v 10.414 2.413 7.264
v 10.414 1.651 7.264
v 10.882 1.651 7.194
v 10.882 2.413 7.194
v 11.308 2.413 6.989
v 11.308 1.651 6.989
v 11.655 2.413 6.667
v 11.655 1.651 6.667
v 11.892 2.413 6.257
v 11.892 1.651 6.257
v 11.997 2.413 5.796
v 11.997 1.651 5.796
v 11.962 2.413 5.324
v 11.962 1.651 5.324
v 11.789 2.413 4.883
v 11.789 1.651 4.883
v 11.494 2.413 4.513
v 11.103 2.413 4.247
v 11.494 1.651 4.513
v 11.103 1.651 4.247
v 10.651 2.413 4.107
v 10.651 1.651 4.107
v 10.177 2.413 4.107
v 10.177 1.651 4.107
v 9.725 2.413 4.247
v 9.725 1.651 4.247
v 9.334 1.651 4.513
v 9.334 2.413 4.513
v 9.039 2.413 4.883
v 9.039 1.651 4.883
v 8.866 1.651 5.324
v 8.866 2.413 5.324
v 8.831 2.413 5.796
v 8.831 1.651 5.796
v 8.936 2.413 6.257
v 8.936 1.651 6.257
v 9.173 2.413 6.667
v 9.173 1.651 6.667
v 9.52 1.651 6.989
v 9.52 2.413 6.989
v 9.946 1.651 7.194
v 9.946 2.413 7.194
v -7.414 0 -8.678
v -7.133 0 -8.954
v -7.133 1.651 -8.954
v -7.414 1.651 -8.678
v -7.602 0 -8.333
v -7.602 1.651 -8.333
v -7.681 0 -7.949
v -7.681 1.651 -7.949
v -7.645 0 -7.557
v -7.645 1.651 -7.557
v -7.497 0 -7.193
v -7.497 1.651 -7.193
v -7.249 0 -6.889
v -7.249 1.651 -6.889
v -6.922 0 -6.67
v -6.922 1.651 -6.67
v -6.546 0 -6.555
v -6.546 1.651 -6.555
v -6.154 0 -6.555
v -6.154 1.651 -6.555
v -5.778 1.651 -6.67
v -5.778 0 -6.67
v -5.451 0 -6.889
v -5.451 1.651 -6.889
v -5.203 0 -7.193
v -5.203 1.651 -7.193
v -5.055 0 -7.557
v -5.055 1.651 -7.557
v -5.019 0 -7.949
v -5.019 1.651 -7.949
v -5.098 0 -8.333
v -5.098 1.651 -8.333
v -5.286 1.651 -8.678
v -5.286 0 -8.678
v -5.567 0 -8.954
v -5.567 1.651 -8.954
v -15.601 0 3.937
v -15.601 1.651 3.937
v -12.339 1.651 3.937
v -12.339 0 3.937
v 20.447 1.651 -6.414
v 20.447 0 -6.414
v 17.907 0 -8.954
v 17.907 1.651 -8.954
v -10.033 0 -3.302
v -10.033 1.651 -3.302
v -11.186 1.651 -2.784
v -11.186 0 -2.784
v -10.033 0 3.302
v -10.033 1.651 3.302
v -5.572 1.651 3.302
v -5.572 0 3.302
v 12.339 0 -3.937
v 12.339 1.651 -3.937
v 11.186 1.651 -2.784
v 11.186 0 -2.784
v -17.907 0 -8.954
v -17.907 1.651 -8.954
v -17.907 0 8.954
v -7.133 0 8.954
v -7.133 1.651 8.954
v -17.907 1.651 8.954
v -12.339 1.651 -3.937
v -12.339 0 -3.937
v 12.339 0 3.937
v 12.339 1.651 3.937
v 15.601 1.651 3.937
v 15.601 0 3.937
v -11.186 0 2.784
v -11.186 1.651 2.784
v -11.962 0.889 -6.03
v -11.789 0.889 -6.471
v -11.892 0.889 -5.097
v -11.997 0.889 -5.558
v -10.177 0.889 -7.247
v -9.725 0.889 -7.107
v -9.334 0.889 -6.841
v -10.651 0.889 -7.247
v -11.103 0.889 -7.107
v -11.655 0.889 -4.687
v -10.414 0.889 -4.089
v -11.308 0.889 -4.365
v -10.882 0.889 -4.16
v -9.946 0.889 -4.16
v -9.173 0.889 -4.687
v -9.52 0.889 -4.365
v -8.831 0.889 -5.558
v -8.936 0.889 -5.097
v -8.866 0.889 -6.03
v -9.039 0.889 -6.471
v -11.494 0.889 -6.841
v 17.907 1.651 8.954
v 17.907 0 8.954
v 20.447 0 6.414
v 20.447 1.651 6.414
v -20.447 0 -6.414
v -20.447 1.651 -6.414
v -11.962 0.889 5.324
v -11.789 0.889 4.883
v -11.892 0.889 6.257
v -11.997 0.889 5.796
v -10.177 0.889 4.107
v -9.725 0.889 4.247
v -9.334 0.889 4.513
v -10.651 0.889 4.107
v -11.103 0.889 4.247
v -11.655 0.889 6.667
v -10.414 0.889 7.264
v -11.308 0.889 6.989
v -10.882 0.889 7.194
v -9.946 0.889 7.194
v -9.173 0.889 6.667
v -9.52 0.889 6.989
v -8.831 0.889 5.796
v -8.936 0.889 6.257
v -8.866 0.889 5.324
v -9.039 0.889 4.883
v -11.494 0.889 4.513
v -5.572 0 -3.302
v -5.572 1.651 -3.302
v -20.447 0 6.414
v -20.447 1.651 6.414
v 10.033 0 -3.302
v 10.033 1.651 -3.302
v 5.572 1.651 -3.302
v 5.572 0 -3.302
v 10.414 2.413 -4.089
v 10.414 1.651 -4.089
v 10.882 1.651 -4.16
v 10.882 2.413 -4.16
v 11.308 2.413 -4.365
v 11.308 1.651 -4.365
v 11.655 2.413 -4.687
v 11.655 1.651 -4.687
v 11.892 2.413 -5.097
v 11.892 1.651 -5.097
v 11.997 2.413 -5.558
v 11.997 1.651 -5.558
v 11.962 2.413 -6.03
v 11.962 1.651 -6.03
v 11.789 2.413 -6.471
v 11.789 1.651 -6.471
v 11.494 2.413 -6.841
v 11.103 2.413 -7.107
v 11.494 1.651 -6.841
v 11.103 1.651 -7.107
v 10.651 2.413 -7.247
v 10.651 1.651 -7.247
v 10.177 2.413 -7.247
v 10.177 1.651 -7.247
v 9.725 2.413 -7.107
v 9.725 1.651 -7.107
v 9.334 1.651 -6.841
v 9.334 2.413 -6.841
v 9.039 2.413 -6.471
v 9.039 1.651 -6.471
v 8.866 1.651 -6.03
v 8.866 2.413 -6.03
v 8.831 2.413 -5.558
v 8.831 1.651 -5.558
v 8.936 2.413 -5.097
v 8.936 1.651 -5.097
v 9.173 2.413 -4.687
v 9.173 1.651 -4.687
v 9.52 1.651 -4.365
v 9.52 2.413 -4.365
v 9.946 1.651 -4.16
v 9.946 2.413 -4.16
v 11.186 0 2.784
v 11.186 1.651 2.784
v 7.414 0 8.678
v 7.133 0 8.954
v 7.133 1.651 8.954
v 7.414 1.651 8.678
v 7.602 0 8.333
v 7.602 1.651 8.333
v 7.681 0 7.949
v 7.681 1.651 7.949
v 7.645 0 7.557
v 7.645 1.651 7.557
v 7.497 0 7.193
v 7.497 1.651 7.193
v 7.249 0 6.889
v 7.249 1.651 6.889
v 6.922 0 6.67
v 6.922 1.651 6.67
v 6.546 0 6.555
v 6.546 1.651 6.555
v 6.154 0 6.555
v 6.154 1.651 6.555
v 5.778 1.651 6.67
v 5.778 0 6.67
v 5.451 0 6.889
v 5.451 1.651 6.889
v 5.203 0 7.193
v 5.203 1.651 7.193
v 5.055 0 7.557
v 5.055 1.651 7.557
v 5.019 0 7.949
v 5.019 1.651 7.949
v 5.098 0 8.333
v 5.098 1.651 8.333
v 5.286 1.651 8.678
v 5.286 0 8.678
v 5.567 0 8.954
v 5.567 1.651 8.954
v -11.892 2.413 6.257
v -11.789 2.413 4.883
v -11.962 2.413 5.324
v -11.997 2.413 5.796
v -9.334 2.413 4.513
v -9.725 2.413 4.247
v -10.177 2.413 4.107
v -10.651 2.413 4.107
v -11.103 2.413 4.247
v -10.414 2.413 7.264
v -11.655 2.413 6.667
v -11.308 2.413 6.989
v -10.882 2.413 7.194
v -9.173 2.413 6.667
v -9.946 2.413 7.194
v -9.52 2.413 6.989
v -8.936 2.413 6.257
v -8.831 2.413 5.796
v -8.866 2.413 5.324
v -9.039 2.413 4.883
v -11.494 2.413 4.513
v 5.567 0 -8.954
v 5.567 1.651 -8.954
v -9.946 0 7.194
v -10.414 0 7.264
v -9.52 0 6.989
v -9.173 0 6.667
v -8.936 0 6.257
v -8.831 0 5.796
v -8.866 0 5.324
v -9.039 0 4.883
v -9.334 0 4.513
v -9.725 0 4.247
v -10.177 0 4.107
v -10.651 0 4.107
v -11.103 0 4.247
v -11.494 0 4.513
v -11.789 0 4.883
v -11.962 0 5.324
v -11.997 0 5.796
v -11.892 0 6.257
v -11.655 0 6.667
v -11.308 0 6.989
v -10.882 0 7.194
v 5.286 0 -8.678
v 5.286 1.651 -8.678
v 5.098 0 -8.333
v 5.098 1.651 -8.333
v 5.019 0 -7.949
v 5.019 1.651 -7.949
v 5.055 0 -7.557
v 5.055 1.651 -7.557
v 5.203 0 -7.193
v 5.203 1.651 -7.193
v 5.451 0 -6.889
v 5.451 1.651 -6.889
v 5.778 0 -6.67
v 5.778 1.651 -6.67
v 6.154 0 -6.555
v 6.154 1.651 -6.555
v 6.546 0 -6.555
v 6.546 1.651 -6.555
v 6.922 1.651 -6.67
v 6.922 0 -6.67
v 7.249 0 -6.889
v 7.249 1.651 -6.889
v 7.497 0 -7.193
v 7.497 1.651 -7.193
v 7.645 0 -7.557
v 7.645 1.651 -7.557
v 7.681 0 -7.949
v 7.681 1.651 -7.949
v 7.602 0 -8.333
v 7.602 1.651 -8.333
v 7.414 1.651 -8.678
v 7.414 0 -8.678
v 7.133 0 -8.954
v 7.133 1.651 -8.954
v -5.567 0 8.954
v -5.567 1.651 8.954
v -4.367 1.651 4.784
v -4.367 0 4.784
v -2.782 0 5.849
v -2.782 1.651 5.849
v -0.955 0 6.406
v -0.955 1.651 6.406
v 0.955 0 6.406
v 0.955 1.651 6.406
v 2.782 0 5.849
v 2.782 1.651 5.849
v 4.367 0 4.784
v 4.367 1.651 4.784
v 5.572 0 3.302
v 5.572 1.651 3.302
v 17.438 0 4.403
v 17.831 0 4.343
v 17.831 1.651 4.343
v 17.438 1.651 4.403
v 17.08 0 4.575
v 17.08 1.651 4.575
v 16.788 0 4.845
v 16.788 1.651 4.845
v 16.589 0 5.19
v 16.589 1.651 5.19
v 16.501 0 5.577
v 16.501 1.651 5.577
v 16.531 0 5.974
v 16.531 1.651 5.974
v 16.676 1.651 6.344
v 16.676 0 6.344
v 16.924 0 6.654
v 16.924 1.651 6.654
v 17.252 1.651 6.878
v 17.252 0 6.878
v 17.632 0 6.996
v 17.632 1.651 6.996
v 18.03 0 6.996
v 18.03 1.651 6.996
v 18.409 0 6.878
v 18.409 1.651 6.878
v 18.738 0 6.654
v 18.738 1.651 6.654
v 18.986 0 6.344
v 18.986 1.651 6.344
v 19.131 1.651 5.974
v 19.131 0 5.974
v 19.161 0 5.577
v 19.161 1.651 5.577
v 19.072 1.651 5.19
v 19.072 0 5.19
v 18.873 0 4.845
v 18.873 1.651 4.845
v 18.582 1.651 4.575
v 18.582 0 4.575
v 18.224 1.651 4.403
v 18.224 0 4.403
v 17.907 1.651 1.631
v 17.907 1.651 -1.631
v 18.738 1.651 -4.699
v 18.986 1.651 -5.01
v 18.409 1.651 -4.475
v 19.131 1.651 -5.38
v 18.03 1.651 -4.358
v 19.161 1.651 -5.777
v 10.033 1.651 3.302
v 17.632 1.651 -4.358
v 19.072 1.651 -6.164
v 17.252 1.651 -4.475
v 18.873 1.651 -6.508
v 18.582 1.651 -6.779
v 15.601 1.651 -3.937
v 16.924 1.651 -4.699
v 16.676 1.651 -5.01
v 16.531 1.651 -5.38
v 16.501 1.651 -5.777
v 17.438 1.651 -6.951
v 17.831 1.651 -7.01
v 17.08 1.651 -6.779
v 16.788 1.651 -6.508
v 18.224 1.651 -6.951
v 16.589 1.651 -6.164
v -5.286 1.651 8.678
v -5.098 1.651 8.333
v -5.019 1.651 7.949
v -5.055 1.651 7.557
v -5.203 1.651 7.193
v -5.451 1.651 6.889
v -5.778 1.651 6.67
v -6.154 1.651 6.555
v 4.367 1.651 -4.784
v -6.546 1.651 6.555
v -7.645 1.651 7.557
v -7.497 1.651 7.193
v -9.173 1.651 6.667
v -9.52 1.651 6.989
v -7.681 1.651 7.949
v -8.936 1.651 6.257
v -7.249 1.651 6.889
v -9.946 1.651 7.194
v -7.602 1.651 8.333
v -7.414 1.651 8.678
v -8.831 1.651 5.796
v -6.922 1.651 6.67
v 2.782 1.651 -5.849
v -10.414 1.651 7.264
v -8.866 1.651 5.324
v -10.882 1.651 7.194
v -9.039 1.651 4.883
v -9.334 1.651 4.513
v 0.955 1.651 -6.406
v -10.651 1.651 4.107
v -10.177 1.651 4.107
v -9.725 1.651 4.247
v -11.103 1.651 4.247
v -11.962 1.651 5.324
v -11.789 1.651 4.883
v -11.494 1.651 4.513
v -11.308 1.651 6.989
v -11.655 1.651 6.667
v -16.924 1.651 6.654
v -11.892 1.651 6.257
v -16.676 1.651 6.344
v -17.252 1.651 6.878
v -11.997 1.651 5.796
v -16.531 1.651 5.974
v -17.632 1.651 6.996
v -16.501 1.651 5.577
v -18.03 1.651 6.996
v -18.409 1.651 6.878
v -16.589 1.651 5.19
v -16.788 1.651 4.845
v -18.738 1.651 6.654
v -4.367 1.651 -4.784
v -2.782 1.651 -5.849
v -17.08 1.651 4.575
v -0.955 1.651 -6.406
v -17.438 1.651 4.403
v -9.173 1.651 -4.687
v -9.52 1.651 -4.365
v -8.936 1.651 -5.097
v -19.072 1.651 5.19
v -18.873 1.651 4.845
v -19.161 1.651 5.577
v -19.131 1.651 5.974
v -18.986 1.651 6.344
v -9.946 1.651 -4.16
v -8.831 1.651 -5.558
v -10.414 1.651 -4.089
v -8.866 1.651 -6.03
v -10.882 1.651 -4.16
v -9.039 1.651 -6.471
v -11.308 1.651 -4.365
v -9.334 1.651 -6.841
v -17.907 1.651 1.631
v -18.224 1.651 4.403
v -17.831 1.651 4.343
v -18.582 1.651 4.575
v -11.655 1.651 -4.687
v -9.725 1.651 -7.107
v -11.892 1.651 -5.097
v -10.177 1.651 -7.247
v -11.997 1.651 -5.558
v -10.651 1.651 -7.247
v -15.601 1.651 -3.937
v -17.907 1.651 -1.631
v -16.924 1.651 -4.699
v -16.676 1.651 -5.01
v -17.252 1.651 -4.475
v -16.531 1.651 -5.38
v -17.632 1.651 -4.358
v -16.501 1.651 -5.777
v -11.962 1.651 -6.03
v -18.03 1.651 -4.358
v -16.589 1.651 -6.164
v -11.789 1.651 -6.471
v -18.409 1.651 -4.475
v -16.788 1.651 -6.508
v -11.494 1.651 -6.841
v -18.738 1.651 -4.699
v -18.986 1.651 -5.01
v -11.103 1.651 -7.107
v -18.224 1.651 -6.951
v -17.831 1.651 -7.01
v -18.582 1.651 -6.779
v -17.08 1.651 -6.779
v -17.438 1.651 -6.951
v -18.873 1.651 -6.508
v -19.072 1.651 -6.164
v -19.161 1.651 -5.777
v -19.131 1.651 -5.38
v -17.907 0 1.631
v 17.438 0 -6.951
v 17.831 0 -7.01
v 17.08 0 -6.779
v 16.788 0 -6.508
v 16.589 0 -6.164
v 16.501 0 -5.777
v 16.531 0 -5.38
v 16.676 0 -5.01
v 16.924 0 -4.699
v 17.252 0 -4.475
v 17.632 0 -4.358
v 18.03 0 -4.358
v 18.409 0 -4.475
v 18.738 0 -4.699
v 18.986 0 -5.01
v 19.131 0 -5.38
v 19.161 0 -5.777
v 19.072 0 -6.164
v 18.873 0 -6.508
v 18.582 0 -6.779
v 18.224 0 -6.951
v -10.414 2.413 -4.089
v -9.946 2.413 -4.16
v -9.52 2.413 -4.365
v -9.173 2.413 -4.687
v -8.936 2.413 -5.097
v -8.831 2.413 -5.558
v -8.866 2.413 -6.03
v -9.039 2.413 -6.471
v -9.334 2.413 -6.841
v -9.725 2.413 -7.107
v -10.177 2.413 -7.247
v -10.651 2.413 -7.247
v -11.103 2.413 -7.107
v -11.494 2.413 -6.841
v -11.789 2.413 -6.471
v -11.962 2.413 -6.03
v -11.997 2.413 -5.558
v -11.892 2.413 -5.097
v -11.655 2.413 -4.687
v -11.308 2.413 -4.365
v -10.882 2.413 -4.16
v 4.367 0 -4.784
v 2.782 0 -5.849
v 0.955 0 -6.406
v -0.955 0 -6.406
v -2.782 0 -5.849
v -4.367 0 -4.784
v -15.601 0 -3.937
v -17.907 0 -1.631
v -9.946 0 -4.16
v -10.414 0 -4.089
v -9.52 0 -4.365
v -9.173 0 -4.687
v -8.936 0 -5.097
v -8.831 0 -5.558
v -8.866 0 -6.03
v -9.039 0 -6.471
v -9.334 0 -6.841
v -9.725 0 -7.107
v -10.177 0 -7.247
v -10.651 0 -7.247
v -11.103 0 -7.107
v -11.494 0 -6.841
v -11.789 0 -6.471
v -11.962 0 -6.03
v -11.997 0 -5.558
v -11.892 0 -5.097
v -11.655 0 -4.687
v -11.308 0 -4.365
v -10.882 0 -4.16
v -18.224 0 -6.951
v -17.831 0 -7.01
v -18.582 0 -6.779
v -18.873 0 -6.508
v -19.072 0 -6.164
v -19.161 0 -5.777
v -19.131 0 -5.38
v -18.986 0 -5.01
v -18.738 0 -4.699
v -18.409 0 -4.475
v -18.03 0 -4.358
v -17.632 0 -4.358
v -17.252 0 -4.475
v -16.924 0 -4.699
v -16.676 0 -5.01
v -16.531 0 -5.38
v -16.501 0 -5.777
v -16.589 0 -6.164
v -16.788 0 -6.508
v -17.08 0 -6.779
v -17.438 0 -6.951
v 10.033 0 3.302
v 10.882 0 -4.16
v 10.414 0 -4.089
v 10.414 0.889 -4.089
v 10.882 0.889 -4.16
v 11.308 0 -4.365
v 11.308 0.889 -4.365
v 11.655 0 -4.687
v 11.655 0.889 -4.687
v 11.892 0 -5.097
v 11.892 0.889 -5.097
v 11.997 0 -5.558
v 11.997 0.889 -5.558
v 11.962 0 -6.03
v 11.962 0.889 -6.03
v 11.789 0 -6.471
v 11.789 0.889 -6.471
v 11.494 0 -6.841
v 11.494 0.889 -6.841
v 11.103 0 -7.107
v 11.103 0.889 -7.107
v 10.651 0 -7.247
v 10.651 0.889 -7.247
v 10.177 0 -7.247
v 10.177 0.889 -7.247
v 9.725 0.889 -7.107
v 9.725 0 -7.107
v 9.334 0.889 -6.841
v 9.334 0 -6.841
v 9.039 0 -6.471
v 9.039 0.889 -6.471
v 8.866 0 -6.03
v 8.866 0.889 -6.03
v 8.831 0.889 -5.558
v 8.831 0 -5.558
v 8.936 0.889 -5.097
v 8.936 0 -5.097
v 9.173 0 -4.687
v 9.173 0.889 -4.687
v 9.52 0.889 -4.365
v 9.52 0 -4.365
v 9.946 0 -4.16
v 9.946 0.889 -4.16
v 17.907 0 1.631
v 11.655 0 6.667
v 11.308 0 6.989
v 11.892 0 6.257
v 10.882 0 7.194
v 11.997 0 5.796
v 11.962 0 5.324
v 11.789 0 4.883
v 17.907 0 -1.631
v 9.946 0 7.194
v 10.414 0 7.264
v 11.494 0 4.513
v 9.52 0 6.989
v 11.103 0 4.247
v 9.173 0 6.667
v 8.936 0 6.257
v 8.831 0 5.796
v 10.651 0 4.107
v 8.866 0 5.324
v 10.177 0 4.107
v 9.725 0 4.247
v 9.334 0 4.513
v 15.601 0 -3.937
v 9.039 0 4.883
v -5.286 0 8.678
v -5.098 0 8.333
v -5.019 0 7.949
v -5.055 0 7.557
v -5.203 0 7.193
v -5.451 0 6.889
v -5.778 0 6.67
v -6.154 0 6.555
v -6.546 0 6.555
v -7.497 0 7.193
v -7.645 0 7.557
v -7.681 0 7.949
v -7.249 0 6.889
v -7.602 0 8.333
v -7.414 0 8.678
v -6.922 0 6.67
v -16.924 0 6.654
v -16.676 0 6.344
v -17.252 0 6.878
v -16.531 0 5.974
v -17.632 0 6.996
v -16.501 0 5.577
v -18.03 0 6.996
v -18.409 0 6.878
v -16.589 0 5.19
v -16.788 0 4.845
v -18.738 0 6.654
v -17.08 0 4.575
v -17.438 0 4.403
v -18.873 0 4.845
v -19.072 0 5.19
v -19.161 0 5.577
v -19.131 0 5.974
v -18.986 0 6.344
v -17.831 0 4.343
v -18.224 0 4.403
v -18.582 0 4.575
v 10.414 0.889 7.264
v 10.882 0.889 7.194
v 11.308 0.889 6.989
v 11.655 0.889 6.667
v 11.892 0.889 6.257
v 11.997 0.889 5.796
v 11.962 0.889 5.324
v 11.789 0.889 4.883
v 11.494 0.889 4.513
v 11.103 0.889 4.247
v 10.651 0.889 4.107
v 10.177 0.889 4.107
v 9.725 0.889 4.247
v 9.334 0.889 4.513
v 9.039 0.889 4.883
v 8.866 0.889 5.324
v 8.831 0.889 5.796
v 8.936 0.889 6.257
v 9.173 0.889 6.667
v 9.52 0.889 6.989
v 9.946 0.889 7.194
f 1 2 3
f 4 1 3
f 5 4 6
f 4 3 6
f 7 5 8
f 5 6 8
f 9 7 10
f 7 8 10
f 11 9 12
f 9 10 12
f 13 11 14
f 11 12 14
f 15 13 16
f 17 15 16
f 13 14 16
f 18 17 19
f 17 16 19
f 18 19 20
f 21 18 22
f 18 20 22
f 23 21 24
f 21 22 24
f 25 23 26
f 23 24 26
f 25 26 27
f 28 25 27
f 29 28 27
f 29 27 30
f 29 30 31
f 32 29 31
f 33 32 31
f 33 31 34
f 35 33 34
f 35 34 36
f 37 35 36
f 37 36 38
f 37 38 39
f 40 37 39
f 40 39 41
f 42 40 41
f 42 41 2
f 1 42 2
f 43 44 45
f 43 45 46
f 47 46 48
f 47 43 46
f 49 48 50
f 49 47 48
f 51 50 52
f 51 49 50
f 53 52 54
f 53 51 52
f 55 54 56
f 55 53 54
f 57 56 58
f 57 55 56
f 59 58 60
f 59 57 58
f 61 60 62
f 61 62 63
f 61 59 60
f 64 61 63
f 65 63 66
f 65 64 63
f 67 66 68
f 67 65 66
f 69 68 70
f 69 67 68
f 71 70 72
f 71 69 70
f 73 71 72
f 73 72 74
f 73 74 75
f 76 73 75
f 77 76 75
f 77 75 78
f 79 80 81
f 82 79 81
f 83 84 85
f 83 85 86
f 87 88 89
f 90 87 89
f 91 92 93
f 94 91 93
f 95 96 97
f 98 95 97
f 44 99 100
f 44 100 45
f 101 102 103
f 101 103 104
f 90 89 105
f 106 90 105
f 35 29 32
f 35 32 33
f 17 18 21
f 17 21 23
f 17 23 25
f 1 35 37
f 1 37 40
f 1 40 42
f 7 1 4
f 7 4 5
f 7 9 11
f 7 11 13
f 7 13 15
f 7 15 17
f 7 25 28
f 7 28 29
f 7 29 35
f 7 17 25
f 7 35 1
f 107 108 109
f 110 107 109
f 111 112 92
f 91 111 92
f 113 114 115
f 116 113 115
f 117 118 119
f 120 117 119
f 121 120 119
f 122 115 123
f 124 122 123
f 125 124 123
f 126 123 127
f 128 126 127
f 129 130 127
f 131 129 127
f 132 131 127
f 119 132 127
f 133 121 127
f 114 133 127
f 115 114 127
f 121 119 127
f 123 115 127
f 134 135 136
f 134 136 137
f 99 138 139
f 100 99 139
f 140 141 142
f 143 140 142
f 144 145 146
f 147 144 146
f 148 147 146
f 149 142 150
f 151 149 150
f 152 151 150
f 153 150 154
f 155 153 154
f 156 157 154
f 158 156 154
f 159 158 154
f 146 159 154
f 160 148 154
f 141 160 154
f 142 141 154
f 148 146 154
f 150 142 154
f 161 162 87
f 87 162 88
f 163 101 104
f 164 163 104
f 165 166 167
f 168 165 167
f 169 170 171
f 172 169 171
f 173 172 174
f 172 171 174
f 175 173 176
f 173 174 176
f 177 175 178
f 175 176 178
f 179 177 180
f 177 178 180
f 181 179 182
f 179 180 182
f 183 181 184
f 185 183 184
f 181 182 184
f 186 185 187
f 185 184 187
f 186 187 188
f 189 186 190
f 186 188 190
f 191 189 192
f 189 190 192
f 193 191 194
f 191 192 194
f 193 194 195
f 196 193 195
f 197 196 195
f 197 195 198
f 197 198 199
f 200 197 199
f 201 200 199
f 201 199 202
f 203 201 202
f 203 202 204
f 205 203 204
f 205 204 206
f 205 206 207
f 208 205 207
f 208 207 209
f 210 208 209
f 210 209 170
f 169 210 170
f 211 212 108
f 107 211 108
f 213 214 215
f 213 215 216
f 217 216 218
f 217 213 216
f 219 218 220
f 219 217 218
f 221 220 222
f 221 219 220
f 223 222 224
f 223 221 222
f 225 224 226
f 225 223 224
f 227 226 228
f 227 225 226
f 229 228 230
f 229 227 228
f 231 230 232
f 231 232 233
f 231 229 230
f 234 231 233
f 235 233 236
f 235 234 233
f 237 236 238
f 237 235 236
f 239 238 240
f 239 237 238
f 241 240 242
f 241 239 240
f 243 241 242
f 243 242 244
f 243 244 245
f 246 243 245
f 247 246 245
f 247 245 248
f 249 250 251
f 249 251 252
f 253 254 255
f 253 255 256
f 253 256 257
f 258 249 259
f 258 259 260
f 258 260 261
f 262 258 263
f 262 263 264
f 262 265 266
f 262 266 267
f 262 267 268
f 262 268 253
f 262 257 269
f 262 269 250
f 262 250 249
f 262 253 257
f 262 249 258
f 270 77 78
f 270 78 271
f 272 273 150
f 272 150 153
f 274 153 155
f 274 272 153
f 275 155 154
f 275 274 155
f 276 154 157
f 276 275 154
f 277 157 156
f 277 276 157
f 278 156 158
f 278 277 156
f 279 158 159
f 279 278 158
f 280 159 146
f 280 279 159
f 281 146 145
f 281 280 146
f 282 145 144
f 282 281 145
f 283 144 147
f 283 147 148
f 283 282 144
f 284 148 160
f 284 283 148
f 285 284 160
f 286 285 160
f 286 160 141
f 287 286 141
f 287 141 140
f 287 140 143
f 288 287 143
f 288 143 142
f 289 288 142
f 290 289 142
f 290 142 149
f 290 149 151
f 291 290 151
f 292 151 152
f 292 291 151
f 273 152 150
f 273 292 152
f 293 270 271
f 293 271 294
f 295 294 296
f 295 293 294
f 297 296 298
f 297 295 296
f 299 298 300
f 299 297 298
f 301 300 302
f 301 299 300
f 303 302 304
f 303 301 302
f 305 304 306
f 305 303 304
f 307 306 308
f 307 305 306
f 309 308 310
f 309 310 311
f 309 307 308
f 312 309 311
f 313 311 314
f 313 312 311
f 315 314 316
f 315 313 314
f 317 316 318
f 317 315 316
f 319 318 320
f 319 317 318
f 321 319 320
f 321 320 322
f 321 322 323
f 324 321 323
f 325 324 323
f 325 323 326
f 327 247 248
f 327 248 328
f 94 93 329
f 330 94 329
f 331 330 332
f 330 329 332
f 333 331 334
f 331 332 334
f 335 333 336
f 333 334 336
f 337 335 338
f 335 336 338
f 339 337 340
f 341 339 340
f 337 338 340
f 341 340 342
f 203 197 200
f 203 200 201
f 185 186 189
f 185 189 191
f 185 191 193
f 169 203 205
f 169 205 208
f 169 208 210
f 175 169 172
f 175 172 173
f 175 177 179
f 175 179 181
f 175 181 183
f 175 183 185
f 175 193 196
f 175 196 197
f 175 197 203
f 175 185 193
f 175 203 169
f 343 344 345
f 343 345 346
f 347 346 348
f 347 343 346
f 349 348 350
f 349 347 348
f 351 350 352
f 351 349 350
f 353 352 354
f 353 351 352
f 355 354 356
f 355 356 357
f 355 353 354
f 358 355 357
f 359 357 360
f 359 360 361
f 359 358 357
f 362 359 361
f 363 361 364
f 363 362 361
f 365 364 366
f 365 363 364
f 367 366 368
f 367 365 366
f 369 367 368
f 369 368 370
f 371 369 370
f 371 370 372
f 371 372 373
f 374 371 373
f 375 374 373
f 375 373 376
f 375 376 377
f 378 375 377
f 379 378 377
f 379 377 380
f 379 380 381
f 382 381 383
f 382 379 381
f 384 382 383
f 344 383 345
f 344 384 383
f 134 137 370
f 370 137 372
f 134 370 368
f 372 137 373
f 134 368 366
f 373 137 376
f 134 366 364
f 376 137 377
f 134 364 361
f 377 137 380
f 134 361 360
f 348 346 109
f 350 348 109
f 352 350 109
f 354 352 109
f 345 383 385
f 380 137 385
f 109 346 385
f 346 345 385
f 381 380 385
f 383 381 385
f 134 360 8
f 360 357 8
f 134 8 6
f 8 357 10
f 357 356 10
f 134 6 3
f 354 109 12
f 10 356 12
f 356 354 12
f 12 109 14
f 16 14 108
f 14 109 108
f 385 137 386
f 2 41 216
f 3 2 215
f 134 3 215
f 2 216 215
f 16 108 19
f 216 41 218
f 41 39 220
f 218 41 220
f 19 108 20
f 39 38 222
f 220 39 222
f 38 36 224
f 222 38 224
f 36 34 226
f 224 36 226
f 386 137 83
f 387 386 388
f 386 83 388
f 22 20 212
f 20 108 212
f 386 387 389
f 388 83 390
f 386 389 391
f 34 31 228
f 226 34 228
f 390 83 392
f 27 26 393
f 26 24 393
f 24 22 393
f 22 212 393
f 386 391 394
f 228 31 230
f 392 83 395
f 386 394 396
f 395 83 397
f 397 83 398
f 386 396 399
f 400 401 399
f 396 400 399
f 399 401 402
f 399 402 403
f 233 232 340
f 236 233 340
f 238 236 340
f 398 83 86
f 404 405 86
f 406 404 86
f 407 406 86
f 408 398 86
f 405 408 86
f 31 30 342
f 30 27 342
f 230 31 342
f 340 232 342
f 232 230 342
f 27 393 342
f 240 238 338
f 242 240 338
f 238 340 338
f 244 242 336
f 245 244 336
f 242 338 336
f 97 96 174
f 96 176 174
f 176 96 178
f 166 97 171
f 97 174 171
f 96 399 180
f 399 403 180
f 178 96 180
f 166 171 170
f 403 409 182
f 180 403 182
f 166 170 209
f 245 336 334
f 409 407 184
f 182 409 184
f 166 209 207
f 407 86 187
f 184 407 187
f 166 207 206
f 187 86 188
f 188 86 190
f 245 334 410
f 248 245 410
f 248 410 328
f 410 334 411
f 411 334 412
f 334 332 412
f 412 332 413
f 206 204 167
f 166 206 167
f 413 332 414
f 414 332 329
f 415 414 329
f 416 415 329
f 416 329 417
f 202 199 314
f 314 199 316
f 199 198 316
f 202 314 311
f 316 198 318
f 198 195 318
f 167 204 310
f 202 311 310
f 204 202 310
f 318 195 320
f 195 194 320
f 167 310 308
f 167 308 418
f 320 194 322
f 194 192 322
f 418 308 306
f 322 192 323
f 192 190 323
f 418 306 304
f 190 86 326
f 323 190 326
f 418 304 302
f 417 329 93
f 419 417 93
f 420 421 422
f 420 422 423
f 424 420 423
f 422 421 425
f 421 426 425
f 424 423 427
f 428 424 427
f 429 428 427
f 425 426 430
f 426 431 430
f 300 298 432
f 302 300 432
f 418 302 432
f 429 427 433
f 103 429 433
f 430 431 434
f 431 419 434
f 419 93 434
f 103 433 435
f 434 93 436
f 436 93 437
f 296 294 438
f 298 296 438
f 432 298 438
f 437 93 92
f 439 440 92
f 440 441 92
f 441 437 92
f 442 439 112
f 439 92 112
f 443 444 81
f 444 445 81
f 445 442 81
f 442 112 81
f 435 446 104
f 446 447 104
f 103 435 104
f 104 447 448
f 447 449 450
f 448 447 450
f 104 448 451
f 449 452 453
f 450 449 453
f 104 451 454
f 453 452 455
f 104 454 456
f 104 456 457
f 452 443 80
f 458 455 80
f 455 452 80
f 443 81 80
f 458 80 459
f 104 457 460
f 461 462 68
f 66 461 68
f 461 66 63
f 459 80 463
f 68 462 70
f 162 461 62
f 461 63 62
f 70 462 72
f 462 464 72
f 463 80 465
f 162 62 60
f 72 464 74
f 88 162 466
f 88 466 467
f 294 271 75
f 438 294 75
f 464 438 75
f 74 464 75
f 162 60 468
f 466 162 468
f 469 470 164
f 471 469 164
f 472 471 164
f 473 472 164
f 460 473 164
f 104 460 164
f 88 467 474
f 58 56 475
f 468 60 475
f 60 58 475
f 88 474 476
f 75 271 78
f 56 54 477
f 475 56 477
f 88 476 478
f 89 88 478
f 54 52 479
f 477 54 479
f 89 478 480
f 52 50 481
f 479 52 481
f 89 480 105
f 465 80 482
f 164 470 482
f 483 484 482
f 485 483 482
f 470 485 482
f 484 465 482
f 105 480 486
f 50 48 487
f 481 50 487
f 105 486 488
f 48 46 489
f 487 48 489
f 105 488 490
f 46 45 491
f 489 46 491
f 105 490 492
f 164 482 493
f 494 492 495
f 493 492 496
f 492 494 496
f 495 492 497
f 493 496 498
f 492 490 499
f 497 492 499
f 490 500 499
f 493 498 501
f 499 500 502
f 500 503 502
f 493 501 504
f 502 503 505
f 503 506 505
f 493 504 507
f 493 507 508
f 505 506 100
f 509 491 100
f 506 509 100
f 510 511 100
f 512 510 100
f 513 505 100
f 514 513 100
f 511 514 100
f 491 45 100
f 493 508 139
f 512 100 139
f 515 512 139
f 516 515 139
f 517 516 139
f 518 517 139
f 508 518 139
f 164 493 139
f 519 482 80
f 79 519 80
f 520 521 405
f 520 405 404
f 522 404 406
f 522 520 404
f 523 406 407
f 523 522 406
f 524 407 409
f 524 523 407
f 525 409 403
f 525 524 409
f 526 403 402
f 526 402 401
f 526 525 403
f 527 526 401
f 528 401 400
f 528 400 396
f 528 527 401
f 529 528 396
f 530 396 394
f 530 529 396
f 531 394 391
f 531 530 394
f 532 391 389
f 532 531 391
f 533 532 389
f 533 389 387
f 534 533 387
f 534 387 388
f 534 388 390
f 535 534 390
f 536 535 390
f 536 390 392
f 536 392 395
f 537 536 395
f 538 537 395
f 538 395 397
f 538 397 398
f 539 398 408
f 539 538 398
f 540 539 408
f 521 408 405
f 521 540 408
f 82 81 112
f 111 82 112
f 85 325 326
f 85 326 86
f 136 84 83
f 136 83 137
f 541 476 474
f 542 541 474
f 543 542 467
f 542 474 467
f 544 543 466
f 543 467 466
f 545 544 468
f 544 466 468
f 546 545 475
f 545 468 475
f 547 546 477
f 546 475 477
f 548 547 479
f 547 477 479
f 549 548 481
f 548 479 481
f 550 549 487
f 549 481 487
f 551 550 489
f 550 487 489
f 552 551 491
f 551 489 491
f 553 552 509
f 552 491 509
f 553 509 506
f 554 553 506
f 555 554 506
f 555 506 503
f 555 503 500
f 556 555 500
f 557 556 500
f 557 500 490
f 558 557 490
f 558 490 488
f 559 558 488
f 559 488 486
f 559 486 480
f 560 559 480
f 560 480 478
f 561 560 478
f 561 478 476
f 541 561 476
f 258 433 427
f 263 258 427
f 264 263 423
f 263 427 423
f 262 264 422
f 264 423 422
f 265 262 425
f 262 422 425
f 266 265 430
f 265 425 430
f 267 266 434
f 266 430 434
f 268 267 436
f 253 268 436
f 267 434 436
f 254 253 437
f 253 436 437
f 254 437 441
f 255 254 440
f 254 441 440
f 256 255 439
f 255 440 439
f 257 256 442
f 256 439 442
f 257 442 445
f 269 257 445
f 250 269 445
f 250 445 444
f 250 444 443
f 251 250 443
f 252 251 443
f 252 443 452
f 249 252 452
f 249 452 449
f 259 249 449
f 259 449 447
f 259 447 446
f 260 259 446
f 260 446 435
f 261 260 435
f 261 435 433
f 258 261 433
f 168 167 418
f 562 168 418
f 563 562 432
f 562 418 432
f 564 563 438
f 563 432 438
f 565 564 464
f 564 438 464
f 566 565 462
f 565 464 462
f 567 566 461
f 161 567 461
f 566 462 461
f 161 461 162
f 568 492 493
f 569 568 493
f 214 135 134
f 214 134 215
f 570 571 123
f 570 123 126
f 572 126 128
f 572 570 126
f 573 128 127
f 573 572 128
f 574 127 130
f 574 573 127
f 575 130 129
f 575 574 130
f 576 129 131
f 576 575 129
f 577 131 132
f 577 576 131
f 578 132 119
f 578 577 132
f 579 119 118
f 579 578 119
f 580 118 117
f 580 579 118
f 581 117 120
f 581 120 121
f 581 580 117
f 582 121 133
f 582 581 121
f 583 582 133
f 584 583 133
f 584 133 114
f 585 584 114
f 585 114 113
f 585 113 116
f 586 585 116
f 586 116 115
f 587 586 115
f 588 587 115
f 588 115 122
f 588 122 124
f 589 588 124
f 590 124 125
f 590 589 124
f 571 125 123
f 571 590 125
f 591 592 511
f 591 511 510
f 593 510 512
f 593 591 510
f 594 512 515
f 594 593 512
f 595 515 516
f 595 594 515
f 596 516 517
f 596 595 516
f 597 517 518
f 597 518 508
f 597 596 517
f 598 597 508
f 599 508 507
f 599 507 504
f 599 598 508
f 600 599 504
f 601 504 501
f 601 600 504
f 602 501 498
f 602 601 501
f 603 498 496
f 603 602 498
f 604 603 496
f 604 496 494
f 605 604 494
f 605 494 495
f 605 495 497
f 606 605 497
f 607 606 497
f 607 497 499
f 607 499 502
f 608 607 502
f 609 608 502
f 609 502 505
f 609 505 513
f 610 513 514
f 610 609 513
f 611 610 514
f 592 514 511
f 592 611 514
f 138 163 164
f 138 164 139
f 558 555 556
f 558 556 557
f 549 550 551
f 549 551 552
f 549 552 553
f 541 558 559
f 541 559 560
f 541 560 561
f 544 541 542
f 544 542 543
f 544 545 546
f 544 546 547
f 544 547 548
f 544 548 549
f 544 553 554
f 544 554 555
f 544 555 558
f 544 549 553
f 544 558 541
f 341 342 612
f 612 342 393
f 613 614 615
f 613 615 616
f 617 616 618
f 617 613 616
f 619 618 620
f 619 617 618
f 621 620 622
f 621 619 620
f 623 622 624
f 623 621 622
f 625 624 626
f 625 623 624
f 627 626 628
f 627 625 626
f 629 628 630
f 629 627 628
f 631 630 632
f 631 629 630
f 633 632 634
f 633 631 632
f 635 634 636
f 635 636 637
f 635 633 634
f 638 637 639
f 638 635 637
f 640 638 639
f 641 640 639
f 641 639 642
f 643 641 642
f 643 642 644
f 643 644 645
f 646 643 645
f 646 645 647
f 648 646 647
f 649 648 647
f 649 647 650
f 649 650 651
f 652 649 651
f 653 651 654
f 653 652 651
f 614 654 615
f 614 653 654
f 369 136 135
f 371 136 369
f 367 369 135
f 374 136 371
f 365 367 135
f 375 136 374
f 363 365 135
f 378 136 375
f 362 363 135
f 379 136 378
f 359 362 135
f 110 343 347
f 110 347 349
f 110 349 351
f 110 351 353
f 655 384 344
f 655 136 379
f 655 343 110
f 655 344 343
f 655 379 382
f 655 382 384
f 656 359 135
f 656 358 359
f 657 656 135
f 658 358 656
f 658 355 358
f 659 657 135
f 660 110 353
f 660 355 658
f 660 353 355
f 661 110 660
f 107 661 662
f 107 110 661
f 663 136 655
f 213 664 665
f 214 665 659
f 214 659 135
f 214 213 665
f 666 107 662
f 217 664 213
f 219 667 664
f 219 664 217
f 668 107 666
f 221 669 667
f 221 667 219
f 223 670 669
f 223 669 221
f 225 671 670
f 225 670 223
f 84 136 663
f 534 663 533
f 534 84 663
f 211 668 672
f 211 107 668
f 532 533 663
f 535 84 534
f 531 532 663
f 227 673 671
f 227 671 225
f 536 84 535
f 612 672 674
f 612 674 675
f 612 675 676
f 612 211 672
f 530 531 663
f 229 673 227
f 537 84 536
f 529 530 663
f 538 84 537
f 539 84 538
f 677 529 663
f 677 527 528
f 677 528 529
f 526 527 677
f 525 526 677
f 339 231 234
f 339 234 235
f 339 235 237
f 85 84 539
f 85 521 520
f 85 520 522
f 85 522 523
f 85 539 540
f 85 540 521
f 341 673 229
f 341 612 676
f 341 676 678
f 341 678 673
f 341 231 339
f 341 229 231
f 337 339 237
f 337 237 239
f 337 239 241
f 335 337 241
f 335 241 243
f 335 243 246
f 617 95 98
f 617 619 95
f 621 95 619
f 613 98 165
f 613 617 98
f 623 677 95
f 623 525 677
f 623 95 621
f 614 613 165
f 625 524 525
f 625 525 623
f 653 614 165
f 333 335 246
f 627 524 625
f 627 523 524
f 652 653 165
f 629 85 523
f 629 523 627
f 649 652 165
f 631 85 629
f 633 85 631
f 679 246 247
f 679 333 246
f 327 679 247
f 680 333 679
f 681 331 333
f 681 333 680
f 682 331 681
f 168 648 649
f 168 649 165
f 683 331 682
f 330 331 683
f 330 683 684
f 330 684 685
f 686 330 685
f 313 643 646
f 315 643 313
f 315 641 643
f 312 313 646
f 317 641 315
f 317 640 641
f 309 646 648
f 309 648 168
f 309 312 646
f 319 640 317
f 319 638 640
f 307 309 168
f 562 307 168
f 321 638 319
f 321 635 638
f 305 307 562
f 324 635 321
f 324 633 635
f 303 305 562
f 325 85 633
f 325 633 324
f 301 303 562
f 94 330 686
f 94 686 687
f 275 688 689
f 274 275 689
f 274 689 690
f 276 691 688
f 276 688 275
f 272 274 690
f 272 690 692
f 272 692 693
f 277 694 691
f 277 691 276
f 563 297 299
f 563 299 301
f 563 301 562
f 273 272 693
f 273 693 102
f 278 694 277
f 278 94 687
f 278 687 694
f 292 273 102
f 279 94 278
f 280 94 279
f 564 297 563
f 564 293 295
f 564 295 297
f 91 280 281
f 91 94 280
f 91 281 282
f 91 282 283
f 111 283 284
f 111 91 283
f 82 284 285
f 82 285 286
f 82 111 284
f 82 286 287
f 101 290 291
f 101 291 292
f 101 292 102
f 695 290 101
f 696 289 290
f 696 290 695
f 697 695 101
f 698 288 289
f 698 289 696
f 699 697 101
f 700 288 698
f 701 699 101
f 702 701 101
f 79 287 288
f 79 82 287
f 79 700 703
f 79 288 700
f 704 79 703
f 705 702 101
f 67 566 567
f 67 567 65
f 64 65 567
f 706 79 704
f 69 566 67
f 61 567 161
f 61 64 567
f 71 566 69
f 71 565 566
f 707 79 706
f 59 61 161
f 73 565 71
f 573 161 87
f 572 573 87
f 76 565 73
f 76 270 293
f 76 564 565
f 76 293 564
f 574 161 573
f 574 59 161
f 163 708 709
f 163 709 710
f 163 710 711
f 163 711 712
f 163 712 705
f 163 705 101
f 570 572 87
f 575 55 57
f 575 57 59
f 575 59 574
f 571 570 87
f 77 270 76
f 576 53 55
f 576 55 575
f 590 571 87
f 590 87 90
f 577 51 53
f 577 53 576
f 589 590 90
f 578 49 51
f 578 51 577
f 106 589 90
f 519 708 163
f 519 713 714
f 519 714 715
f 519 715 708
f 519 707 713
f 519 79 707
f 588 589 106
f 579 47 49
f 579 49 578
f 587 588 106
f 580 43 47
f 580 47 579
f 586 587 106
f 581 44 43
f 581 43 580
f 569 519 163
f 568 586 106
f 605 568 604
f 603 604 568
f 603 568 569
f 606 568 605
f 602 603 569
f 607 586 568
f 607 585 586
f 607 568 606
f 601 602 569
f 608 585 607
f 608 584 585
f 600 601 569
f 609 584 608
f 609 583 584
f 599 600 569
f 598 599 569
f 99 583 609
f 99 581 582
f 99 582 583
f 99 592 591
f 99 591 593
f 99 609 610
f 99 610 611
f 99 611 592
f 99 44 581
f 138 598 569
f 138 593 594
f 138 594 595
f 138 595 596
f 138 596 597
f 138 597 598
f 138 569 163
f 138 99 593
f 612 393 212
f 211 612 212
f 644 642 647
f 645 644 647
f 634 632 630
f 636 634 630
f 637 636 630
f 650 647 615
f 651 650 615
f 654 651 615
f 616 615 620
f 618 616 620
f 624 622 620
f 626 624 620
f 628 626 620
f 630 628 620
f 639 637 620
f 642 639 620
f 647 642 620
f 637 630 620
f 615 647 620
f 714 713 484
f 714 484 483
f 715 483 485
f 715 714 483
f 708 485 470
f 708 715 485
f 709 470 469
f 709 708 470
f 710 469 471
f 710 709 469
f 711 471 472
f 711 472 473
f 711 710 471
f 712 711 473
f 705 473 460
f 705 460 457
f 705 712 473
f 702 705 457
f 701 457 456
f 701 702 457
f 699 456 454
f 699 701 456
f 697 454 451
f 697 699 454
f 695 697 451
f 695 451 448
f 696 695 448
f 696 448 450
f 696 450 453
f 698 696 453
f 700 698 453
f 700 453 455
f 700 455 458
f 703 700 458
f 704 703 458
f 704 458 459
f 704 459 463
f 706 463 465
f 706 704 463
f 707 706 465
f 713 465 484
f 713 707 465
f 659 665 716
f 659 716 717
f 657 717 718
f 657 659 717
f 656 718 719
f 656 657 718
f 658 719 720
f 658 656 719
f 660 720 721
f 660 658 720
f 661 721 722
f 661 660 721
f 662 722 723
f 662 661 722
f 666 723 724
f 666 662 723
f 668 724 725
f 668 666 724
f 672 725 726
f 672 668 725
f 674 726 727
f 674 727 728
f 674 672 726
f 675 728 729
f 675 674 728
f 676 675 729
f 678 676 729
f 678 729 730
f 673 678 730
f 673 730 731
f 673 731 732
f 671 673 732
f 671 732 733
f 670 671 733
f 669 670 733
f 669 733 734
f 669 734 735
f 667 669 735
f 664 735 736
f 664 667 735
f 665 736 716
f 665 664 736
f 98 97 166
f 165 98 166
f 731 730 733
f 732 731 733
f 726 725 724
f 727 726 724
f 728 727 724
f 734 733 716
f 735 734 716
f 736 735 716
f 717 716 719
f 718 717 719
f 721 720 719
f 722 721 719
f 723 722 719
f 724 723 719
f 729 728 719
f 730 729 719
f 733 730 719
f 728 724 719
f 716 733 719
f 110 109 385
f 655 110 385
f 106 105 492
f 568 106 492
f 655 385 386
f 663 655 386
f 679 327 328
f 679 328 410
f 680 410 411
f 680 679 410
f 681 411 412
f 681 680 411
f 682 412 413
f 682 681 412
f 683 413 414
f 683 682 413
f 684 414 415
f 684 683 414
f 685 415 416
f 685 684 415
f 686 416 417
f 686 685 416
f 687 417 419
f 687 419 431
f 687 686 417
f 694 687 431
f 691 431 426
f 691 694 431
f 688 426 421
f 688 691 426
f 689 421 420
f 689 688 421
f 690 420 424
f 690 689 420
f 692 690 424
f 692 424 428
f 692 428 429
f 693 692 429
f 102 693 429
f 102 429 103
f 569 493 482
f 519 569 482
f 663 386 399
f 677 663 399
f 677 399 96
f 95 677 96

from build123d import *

# Parameters (mm, degrees)
SKETCH1_R           = 1.3335
SKETCH1_R_2         = 1.5875
BOSS_EXTRUDE1_DEPTH = 1.651
CHAMFER1_SIZE       = 2.54
SKETCH1_2_R         = 1.5875
BOSS_EXTRUDE2_DEPTH = 2.413
SKETCH1_3_R         = 1.5875
CUT_EXTRUDE1_DEPTH  = 0.889
CUT_EXTRUDE2_DEPTH  = 23.382376376


with BuildPart() as part:
    # Sketch1 → Boss-Extrude1 (new body)
    with BuildSketch(Plane(origin=(0, 0, 0), x_dir=(1, 0, 0), z_dir=(0, 1, 0))):
        with BuildLine():
            Line((-5.567119422, 8.9535), (5.567119422, 8.9535))
            ThreePointArc((5.567119422, 8.9535), (6.35, 6.5405), (7.132880578, 8.9535))
            Line((7.132880578, 8.9535), (20.447, 8.9535))
            Line((20.447, 8.9535), (20.447, -8.9535))
            Line((20.447, -8.9535), (7.132880578, -8.9535))
            ThreePointArc((7.132880578, -8.9535), (6.35, -6.5405), (5.567119422, -8.9535))
            Line((5.567119422, -8.9535), (-5.567119422, -8.9535))
            ThreePointArc((-5.567119422, -8.9535), (-6.35, -6.5405), (-7.132880578, -8.9535))
            Line((-7.132880578, -8.9535), (-20.447, -8.9535))
            Line((-20.447, -8.9535), (-20.447, 8.9535))
            Line((-20.447, 8.9535), (-7.132880578, 8.9535))
            ThreePointArc((-7.132880578, 8.9535), (-6.35, 6.5405), (-5.567119422, 8.9535))
        make_face()
        with Locations((-17.8308, 5.6769)):
            Circle(SKETCH1_R, mode=Mode.SUBTRACT)
        with Locations((17.8308, 5.6769)):
            Circle(SKETCH1_R, mode=Mode.SUBTRACT)
        with Locations((17.8308, -5.6769)):
            Circle(SKETCH1_R, mode=Mode.SUBTRACT)
        with Locations((-17.8308, -5.6769)):
            Circle(SKETCH1_R, mode=Mode.SUBTRACT)
        with Locations((-10.414, 5.6769)):
            Circle(SKETCH1_R_2, mode=Mode.SUBTRACT)
        with Locations((10.414, 5.6769)):
            Circle(SKETCH1_R_2, mode=Mode.SUBTRACT)
        with Locations((10.414, -5.6769)):
            Circle(SKETCH1_R_2, mode=Mode.SUBTRACT)
        with Locations((-10.414, -5.6769)):
            Circle(SKETCH1_R_2, mode=Mode.SUBTRACT)
    extrude(amount=BOSS_EXTRUDE1_DEPTH)

    # Chamfer1
    chamfer1_edges = [part.edges().sort_by_distance(p)[0] for p in [
        (-20.447, 0.8255, 8.9535),
        (-20.447, 0.8255, -8.9535),
        (20.447, 0.8255, -8.9535),
        (20.447, 0.8255, 8.9535),
    ]]
    chamfer(chamfer1_edges, length=CHAMFER1_SIZE)

    # Sketch1<2> → Boss-Extrude2 (add)
    with BuildSketch(Plane(origin=(0, 0, 0), x_dir=(1, 0, 0), z_dir=(0, 1, 0))):
        with Locations((-10.414, 5.6769)):
            Circle(SKETCH1_2_R)
        with Locations((10.414, 5.6769)):
            Circle(SKETCH1_2_R)
        with Locations((10.414, -5.6769)):
            Circle(SKETCH1_2_R)
        with Locations((-10.414, -5.6769)):
            Circle(SKETCH1_2_R)
    extrude(amount=BOSS_EXTRUDE2_DEPTH)

    # Sketch1<3> → Cut-Extrude1 (cut)
    with BuildSketch(Plane(origin=(0, 0, 0), x_dir=(1, 0, 0), z_dir=(0, 1, 0))):
        with Locations((-10.414, 5.6769)):
            Circle(SKETCH1_3_R)
        with Locations((10.414, 5.6769)):
            Circle(SKETCH1_3_R)
        with Locations((10.414, -5.6769)):
            Circle(SKETCH1_3_R)
        with Locations((-10.414, -5.6769)):
            Circle(SKETCH1_3_R)
    extrude(amount=CUT_EXTRUDE1_DEPTH, mode=Mode.SUBTRACT)

    # Sketch2 → Cut-Extrude2 (cut, through all)
    with BuildSketch(Plane(origin=(0, 1.651, 0), x_dir=(1, 0, 0), z_dir=(0, 1, 0))):
        with BuildLine():
            Line((-17.907, 1.630758795), (-17.907, -1.630758795))
            Line((-17.907, -1.630758795), (-15.600758795, -3.937))
            Line((-15.600758795, -3.937), (-12.339241205, -3.937))
            Line((-12.339241205, -3.937), (-11.186120602, -2.783879398))
            Line((-11.186120602, -2.783879398), (-10.033, -3.302))
            Line((-10.033, -3.302), (-5.572102386, -3.302))
            ThreePointArc((-5.572102386, -3.302), (0, -6.477), (5.572102386, -3.302))
            Line((5.572102386, -3.302), (10.033, -3.302))
            Line((10.033, -3.302), (11.186120602, -2.783879398))
            Line((11.186120602, -2.783879398), (12.339241205, -3.937))
            Line((12.339241205, -3.937), (15.600758795, -3.937))
            Line((15.600758795, -3.937), (17.907, -1.630758795))
            Line((17.907, -1.630758795), (17.907, 1.630758795))
            Line((17.907, 1.630758795), (15.600758795, 3.937))
            Line((15.600758795, 3.937), (12.339241205, 3.937))
            Line((12.339241205, 3.937), (11.186120602, 2.783879398))
            Line((11.186120602, 2.783879398), (10.033, 3.302))
            Line((10.033, 3.302), (5.572102386, 3.302))
            ThreePointArc((5.572102386, 3.302), (0, 6.477), (-5.572102386, 3.302))
            Line((-5.572102386, 3.302), (-10.033, 3.302))
            Line((-10.033, 3.302), (-11.186120602, 2.783879398))
            Line((-11.186120602, 2.783879398), (-12.339241205, 3.937))
            Line((-12.339241205, 3.937), (-15.600758795, 3.937))
            Line((-15.600758795, 3.937), (-17.907, 1.630758795))
        make_face()
    extrude(amount=-CUT_EXTRUDE2_DEPTH, mode=Mode.SUBTRACT)


solid = part.part
